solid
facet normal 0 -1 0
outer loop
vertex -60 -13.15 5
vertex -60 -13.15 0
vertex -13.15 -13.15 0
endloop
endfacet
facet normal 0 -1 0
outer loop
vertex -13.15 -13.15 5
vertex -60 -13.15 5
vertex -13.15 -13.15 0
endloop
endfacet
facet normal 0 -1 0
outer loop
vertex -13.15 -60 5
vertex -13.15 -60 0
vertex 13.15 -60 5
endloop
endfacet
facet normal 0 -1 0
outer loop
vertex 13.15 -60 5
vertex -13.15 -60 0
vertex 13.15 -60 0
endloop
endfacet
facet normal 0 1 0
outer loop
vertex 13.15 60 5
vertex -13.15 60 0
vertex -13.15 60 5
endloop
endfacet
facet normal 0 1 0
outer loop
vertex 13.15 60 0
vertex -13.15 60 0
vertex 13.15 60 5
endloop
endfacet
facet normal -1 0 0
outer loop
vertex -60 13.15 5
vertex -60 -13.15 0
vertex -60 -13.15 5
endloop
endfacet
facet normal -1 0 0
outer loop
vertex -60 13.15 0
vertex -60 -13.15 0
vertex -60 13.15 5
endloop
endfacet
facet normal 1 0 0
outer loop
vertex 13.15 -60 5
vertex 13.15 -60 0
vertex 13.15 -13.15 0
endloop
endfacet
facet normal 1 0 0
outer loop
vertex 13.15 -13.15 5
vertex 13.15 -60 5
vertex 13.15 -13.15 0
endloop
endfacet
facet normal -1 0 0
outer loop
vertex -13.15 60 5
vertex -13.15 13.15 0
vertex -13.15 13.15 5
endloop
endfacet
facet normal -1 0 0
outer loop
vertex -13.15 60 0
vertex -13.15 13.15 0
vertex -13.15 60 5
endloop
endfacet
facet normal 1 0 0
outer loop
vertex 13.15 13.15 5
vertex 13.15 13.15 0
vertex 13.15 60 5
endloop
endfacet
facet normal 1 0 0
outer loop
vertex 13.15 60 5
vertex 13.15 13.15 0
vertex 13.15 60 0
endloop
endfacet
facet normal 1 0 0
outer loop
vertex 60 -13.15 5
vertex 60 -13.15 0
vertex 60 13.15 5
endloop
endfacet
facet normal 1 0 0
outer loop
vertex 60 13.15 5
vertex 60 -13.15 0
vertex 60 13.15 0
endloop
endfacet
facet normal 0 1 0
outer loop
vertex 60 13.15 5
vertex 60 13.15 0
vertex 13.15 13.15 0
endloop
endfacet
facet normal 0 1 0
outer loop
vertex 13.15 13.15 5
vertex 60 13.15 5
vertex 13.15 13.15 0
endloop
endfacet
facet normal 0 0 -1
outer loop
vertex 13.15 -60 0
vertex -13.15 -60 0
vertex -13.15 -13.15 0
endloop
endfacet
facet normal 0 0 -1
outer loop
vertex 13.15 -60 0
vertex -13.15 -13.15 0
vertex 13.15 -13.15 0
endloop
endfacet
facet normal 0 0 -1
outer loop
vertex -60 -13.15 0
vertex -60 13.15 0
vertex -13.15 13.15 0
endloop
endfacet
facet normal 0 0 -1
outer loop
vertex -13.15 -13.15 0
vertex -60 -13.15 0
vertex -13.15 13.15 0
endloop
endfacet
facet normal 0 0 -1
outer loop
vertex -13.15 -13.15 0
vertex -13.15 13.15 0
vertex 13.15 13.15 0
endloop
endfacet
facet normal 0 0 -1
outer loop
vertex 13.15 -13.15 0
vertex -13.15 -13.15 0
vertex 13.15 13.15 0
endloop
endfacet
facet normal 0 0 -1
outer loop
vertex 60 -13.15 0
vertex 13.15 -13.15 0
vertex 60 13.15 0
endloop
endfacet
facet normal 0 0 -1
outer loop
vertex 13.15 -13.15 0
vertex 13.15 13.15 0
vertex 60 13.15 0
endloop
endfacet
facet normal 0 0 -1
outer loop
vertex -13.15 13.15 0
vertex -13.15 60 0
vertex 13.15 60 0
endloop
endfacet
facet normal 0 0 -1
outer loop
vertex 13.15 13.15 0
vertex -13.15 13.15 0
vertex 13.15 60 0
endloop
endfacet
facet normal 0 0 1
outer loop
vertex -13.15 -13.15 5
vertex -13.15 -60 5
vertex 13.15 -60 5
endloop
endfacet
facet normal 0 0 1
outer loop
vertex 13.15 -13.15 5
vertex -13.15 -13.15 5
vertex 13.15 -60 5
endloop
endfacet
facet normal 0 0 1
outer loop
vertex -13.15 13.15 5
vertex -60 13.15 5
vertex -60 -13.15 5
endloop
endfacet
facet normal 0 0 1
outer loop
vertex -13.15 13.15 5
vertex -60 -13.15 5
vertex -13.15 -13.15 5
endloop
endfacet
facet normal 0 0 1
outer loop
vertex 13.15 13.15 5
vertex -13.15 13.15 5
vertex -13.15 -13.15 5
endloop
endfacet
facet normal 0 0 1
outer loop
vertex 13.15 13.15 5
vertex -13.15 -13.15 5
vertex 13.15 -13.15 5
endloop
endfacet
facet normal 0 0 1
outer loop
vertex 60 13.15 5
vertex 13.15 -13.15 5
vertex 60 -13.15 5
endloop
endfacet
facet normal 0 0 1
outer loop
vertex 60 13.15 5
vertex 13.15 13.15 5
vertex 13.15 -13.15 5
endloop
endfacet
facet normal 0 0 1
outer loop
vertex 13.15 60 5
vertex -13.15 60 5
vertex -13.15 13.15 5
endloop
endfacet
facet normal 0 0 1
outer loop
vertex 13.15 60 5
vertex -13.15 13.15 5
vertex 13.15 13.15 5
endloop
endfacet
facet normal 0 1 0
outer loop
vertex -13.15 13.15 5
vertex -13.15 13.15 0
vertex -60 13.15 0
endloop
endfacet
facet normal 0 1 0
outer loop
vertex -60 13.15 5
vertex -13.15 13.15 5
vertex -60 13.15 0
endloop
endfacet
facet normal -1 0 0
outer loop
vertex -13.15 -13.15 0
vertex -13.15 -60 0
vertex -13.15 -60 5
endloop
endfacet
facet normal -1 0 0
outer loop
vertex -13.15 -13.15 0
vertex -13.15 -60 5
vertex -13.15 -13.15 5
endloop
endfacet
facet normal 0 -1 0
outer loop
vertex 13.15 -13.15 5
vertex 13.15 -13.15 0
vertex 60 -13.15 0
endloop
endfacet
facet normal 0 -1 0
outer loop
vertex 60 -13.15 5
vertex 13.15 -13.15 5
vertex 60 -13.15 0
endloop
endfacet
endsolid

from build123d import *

# Parameters (mm, degrees)
SKETCH1_W           = 46.85
SKETCH1_H           = 26.3
SKETCH1_W_2         = 26.3
SKETCH1_H_2         = 46.85
BOSS_EXTRUDE1_DEPTH = 5


with BuildPart() as part:
    # Sketch1 → Boss-Extrude1 (new body)
    with BuildSketch(Plane.XY):
        with Locations((-36.575, 0)):
            Rectangle(SKETCH1_W, SKETCH1_H)
        Rectangle(SKETCH1_W_2, SKETCH1_H)
        with Locations((36.575, 0)):
            Rectangle(SKETCH1_W, SKETCH1_H)
        with Locations((0, -36.575)):
            Rectangle(SKETCH1_W_2, SKETCH1_H_2)
        with Locations((0, 36.575)):
            Rectangle(SKETCH1_W_2, SKETCH1_H_2)
    extrude(amount=BOSS_EXTRUDE1_DEPTH)


solid = part.part
